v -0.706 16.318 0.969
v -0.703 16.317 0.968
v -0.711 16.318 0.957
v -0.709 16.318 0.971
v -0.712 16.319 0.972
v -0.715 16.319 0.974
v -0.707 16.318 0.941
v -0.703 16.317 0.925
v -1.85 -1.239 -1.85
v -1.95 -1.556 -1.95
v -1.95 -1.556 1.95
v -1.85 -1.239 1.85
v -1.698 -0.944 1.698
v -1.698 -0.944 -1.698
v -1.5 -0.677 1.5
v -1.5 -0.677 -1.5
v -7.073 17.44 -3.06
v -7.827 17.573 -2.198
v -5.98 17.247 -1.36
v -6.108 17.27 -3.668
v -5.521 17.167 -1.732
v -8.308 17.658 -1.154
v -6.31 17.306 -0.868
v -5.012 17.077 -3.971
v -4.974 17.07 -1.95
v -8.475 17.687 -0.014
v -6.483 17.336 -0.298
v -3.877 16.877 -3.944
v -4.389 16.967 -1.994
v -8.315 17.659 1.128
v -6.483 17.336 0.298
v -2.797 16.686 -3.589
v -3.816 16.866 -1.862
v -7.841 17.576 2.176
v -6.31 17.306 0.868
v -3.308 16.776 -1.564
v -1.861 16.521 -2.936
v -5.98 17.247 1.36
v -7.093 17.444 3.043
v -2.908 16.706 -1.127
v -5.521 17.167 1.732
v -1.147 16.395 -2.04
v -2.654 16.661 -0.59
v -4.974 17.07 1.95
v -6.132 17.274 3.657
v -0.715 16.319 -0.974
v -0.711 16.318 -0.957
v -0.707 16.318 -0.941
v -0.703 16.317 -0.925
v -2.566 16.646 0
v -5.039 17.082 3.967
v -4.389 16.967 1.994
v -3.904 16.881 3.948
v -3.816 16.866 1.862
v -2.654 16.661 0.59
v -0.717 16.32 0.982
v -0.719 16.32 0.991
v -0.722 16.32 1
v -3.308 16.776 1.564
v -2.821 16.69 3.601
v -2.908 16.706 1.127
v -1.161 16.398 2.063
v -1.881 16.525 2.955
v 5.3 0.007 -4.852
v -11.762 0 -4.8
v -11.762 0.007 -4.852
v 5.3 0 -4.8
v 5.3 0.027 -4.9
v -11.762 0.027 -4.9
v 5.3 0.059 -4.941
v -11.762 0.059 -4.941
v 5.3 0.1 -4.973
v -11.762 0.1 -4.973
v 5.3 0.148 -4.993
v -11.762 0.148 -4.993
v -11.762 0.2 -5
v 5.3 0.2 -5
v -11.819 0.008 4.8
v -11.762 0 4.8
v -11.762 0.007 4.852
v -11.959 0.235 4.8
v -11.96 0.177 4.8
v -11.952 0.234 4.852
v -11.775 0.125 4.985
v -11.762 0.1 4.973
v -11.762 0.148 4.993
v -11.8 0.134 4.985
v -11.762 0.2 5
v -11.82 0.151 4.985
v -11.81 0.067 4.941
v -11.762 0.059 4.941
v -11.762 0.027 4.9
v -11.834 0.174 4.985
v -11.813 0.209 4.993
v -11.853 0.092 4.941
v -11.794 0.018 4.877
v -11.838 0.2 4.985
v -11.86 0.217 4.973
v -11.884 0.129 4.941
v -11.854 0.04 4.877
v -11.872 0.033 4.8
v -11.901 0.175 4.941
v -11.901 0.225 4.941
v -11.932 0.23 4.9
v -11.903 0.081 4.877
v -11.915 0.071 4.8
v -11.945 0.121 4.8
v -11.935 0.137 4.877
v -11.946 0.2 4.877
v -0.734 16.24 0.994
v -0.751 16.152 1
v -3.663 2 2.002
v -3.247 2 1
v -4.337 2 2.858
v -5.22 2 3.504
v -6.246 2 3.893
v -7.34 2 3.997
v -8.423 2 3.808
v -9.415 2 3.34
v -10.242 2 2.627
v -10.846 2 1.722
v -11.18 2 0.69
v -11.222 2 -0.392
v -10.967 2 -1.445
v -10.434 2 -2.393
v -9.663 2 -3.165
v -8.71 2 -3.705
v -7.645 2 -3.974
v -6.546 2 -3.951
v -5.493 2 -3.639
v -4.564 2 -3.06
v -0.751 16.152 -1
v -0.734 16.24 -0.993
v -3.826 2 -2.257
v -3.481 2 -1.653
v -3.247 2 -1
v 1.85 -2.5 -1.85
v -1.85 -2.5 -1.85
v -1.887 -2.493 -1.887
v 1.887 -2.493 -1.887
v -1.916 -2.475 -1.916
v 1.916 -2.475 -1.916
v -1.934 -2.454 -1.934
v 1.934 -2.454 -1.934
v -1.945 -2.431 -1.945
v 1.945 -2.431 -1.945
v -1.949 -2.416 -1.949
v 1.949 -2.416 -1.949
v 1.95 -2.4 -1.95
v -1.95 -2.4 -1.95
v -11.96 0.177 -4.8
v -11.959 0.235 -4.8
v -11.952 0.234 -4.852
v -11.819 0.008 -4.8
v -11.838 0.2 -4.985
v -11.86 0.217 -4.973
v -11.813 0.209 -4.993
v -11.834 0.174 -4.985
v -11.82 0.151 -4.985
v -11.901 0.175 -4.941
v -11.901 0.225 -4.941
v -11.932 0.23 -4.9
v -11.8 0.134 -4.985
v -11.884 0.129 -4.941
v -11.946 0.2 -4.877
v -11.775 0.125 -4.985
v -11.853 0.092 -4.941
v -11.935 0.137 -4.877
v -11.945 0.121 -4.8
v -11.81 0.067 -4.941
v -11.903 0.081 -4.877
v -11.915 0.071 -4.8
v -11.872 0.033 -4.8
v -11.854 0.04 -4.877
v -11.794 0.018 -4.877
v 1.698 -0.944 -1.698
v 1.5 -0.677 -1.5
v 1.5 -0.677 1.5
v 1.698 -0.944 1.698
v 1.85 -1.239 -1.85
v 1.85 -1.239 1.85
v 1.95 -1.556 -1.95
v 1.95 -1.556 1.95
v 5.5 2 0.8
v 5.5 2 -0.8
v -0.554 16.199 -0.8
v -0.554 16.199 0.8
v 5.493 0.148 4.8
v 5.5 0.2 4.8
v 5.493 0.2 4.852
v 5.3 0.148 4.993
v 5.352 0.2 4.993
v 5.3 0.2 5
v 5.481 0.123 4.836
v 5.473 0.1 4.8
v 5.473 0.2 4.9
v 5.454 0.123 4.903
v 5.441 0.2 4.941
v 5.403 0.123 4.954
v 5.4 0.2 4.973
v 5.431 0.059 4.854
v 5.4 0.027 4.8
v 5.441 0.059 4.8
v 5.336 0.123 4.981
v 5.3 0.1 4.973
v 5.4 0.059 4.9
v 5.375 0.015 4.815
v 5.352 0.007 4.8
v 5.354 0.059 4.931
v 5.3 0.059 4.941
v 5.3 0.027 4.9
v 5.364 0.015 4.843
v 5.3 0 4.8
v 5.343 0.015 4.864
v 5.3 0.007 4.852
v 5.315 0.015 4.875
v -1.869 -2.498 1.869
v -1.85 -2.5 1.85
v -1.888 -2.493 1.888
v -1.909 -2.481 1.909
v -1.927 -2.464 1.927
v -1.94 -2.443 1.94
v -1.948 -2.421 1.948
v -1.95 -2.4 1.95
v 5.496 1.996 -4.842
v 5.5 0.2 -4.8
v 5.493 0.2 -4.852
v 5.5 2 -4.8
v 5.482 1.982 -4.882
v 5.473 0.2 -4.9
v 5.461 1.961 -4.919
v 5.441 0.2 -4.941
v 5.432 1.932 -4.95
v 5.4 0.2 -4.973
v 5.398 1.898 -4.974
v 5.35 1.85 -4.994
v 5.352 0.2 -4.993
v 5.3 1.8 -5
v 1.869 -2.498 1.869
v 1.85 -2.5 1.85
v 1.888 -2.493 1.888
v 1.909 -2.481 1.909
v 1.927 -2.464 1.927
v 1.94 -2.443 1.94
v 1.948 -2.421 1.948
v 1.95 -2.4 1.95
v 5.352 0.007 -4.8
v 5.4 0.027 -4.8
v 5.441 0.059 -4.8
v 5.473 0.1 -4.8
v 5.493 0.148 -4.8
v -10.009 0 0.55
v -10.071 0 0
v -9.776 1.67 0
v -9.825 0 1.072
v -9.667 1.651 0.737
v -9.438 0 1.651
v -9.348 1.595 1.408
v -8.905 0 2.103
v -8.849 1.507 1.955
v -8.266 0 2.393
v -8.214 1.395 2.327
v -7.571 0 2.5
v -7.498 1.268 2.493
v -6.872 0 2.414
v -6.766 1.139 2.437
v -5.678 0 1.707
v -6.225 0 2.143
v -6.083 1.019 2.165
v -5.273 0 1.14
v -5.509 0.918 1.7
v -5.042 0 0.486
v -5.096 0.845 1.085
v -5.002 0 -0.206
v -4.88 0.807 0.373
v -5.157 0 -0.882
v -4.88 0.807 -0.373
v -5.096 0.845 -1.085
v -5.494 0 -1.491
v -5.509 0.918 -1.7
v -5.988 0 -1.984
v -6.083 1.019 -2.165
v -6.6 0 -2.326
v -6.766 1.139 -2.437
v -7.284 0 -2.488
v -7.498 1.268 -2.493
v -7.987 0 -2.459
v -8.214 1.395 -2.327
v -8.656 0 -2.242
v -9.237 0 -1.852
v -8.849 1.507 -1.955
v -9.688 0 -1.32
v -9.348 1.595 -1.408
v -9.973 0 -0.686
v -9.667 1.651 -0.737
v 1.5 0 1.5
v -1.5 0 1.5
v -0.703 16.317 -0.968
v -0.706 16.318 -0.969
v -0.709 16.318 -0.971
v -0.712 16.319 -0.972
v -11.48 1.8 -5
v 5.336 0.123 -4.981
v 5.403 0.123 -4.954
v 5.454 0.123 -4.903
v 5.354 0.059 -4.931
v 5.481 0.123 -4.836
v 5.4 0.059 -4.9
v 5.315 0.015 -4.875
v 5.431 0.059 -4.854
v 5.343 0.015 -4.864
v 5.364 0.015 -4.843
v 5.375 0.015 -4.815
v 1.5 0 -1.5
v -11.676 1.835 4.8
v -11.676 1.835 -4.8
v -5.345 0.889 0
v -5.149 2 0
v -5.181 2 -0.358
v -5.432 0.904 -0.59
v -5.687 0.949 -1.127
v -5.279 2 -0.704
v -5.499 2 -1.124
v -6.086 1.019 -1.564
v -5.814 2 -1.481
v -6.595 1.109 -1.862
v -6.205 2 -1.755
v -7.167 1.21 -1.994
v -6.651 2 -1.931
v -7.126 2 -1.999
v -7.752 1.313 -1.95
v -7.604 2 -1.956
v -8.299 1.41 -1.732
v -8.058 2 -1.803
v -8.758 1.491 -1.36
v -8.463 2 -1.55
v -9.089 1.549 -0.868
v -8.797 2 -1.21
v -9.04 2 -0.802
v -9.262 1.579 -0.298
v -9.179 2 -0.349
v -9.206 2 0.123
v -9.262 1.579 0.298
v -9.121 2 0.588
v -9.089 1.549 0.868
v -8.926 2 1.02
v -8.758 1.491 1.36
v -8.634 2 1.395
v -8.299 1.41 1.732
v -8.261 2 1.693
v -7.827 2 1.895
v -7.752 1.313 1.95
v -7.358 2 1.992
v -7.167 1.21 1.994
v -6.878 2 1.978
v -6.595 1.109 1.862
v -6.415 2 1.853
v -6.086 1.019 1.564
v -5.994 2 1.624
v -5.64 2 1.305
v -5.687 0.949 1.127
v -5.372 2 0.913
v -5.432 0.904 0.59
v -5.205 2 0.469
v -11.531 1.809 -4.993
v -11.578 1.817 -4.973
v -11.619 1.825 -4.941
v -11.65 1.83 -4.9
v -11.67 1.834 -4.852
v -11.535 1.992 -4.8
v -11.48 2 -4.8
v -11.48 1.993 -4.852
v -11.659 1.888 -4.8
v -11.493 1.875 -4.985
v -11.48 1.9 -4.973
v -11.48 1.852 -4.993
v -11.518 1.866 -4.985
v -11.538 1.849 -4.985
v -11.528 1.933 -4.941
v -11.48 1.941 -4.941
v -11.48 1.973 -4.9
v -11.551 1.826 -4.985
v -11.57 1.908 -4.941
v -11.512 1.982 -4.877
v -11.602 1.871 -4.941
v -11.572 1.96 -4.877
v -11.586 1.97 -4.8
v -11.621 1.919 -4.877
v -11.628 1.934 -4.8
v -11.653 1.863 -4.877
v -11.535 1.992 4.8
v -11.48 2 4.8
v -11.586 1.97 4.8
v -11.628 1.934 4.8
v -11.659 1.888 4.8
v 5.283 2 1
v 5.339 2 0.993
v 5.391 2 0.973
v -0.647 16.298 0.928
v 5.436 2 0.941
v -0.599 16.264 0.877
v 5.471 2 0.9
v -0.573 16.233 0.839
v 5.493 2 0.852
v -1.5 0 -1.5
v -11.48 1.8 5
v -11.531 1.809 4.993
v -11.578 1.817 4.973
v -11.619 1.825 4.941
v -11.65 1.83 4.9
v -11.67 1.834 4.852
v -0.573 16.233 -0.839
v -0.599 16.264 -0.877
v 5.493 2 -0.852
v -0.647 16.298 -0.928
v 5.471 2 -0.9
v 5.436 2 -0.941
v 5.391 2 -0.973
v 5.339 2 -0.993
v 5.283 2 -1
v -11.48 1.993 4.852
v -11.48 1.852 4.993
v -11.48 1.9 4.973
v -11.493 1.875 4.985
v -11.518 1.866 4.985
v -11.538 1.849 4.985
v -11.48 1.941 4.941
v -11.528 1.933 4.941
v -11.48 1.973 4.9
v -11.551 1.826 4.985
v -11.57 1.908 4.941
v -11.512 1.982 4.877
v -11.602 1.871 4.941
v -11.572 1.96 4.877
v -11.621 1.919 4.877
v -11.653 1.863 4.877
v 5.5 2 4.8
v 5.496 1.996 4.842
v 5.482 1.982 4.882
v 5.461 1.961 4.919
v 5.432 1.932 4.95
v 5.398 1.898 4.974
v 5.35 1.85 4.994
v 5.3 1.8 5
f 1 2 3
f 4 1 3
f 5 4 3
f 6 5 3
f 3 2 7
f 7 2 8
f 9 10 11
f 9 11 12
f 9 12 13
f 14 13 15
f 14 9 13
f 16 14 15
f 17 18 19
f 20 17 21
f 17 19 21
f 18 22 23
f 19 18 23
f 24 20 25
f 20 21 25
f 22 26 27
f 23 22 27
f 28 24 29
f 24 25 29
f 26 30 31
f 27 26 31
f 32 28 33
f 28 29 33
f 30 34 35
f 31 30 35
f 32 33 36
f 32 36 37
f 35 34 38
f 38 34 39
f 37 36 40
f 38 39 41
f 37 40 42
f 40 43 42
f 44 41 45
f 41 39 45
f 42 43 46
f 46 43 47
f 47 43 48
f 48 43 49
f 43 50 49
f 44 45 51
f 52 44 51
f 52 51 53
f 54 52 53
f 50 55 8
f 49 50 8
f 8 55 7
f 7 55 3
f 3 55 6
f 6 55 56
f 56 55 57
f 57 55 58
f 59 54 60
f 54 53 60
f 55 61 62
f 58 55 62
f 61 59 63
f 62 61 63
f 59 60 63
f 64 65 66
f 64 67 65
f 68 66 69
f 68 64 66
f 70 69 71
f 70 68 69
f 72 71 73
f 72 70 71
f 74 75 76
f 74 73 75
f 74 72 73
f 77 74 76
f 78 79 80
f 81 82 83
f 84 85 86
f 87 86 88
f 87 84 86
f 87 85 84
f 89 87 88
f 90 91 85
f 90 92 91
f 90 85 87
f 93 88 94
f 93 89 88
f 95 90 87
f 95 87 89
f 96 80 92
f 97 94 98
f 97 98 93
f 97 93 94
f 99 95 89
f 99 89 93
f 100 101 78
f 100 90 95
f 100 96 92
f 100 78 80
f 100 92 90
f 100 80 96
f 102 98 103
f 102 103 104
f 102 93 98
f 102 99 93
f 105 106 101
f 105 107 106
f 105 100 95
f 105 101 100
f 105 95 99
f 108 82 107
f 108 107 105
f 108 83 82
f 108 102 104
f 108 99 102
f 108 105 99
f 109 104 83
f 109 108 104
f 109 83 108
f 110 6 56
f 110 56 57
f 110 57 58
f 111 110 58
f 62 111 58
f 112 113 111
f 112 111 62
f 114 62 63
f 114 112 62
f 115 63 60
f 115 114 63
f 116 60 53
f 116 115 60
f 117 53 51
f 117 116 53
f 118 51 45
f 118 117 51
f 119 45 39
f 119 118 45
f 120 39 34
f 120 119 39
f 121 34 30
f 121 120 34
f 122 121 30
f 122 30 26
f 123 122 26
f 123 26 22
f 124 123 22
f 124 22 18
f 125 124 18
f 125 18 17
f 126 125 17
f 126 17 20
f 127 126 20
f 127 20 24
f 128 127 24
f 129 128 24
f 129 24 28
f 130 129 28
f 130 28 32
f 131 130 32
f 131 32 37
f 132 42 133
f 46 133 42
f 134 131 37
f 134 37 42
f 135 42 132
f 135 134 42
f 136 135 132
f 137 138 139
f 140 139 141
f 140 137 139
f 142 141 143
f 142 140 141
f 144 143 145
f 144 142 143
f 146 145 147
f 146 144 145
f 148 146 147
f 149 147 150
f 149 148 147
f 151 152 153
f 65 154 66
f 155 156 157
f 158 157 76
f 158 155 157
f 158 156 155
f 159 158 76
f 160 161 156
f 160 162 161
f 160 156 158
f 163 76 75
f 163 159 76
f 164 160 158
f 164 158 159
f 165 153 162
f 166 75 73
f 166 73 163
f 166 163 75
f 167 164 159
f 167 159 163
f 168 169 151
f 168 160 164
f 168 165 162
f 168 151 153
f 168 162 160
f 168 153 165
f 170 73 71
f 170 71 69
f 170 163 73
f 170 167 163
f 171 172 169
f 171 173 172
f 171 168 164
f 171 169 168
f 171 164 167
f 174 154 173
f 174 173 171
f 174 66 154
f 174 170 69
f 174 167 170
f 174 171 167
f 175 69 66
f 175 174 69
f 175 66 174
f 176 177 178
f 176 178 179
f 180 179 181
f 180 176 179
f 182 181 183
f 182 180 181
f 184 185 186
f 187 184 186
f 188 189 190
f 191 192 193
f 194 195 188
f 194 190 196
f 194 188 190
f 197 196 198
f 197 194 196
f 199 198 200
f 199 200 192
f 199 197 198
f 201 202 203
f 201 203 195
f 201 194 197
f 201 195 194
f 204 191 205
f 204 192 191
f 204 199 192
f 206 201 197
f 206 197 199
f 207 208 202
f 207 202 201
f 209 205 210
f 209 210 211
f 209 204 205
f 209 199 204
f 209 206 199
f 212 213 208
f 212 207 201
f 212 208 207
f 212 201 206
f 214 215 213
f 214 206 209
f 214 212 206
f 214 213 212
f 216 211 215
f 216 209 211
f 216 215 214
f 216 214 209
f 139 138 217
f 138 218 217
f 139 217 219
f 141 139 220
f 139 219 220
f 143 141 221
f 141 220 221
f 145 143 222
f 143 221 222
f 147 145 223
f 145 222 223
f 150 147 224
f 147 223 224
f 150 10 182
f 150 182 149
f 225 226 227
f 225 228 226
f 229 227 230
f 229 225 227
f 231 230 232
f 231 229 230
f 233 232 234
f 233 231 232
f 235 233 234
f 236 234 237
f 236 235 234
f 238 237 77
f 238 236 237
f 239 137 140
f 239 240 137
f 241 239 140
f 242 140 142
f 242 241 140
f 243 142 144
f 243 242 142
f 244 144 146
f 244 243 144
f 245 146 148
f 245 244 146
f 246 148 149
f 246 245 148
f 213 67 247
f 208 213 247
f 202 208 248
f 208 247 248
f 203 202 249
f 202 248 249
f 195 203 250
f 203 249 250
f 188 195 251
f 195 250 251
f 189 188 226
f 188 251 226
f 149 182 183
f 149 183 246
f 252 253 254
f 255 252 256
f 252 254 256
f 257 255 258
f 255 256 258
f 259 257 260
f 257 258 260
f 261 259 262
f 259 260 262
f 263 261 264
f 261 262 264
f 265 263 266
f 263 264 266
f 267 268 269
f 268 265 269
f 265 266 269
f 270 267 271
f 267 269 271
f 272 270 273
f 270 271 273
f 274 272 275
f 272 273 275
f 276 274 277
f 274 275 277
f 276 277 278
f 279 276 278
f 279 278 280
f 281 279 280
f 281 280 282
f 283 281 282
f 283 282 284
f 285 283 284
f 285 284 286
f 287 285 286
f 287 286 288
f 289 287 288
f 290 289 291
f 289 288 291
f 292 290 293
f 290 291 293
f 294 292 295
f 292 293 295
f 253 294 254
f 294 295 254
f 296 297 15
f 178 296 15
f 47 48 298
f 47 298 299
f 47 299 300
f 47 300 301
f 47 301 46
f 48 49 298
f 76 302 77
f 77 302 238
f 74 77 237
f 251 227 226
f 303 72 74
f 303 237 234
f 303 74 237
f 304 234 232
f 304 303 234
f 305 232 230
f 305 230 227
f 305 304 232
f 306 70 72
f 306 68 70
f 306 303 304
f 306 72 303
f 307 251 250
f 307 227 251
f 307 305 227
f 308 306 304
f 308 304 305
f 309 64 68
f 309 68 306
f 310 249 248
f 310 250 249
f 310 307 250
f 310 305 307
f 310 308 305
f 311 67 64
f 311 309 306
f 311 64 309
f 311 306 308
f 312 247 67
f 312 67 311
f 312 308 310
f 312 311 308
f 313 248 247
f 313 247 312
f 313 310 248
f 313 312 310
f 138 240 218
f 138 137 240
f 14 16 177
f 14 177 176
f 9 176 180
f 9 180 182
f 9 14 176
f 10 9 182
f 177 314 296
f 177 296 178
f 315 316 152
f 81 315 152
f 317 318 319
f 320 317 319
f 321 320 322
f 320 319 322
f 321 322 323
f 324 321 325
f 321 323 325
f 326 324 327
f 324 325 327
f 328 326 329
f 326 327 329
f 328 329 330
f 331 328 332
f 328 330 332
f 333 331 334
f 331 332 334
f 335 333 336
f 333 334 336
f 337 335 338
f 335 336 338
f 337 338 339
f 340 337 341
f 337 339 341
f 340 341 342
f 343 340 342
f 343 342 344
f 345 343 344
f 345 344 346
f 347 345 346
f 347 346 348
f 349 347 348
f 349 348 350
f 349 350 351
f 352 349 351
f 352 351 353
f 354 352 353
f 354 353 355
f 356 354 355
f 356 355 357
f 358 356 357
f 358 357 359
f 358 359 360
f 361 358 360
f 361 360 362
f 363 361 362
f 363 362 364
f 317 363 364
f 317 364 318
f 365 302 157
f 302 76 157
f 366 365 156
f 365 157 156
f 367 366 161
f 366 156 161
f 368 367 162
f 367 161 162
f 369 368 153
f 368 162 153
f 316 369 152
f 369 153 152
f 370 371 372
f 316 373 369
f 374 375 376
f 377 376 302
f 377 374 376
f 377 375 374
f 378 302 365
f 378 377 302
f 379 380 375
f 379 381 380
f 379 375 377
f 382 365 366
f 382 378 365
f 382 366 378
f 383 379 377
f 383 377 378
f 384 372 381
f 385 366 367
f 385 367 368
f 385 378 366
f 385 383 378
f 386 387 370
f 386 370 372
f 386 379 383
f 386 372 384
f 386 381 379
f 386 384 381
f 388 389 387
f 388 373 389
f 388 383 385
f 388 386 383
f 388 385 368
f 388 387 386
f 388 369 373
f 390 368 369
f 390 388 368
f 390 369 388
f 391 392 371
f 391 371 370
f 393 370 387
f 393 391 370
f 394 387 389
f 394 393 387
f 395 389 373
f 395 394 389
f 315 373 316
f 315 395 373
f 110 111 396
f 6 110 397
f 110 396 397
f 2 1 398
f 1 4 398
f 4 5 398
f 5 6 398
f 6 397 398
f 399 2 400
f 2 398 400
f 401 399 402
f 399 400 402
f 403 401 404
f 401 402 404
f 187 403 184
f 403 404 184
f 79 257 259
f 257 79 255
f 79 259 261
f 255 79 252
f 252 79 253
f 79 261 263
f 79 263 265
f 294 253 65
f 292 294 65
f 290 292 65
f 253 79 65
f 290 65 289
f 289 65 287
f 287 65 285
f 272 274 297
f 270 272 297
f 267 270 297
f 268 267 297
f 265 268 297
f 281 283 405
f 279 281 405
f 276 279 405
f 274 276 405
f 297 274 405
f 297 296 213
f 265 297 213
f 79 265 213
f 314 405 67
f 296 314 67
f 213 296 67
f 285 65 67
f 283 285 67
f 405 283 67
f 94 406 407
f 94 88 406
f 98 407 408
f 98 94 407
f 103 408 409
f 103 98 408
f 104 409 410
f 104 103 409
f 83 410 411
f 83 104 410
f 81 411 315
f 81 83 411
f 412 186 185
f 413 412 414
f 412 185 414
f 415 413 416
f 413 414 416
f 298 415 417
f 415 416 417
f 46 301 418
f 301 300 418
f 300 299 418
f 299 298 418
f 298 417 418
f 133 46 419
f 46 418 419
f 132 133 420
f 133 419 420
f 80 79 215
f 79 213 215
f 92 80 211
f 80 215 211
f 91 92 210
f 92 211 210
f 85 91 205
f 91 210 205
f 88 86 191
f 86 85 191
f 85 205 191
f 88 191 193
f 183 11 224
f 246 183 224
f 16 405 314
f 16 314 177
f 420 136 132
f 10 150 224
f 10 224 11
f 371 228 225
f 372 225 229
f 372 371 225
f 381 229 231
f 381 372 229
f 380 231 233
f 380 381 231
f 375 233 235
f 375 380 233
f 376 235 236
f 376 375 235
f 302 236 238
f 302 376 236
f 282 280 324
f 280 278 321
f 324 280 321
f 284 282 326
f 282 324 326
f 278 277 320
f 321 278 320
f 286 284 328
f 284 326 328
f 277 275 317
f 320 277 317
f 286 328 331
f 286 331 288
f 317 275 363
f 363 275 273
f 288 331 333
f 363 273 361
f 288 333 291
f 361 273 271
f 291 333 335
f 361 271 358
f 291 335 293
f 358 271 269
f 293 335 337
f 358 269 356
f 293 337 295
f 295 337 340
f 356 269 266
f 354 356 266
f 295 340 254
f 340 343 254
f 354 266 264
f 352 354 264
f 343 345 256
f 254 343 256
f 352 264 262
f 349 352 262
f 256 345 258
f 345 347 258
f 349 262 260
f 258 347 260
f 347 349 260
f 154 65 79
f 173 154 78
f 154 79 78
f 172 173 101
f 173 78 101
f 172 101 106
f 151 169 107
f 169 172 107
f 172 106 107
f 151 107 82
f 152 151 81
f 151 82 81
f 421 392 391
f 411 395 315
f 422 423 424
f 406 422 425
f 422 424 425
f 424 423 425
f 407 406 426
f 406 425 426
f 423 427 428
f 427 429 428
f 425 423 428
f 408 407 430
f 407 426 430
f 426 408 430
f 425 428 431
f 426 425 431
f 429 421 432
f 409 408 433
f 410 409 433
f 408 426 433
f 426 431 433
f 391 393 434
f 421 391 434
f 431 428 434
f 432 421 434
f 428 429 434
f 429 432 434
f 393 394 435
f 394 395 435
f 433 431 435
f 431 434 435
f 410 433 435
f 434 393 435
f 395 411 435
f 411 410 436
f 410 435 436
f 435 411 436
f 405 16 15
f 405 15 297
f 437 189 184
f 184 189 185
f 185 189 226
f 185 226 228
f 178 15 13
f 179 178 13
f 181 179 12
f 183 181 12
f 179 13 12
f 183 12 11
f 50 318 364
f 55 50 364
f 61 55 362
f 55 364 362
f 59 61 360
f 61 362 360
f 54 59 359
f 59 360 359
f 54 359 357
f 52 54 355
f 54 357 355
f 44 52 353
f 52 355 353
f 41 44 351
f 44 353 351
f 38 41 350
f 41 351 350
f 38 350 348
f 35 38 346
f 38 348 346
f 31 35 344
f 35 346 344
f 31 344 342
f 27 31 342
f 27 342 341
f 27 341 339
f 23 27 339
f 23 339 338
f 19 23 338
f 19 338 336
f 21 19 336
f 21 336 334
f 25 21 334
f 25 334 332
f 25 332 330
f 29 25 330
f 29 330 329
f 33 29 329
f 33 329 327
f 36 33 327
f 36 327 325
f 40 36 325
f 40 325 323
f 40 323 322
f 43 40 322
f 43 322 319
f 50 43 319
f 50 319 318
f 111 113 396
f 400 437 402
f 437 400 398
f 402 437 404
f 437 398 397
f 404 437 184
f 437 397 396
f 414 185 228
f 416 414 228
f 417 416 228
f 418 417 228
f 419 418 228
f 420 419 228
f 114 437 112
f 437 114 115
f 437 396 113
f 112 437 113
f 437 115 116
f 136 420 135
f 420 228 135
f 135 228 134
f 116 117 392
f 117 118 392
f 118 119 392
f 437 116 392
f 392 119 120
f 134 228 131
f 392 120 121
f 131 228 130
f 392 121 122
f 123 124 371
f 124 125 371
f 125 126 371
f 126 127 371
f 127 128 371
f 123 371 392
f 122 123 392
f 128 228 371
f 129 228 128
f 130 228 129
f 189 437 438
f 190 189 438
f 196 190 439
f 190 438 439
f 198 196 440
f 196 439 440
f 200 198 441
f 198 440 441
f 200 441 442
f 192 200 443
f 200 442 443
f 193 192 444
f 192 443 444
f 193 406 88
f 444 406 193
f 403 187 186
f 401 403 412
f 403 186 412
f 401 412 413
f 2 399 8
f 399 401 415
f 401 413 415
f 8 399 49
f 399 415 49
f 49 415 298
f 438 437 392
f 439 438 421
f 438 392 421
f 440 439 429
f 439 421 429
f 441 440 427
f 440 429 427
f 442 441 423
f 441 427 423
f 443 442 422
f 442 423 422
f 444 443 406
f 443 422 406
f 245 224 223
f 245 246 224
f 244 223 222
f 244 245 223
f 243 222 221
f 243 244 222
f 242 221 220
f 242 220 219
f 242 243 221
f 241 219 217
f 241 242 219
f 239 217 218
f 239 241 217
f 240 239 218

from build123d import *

# Parameters (mm, degrees)
EXTRUDE_1_DEPTH          = 5
EXTRUDE_1_DEPTH_BACK     = 5
EXTRUDE_2_DEPTH          = 2
EXTRUDE_2_DEPTH_BACK     = 2
CUT_EXTRUDE_1_DEPTH      = 2
CUT_EXTRUDE_1_DEPTH_BACK = 2
SKETCH_5_R               = 4
SKETCH_5_R_2             = 2
EXTRUDE_3_DEPTH          = 16
EXTRUDE_4_DEPTH          = 1
EXTRUDE_4_DEPTH_BACK     = 1
CUT_EXTRUDE_2_REACH      = 41.97
CUT_EXTRUDE_START        = -16
SKETCH_7_R               = 2.5
CUT_EXTRUDE_3_REACH      = 25.97
SKETCH_8_R               = 2
FILLET_3_R               = 0.2
FILLET_5_R               = 0.2
FILLET_7_R               = 0.2
FILLET_8_R               = 0.1


with BuildPart() as part:
    # 草图1 → 凸台-拉伸1 (new, two sides: drawn at the far end of the back side and taken through both)
    with BuildSketch(Plane.XY.offset(-EXTRUDE_1_DEPTH_BACK)):
        Polygon((0, 0), (5.5, 0), (5.5, 2), (-11.647346039, 2), (-12, 0), align=None)
    extrude(amount=EXTRUDE_1_DEPTH + EXTRUDE_1_DEPTH_BACK)

    # 草图2 → 凸台-拉伸2 (add, two sides: drawn at the far end of the back side and taken through both)
    with BuildSketch(Plane.XY.offset(-EXTRUDE_2_DEPTH_BACK)):
        with BuildLine():
            Line((-1.5, 0), (1.5, 0))
            Line((1.5, 0), (1.5, -0.677124344))
            ThreePointArc((1.5, -0.677124344), (1.780042303, -1.088161527), (1.95, -1.555590279))
            Line((1.95, -1.555590279), (1.95, -2.5))
            Line((1.95, -2.5), (-1.95, -2.5))
            Line((-1.95, -2.5), (-1.95, -1.555590279))
            ThreePointArc((-1.95, -1.555590279), (-1.780042303, -1.088161527), (-1.5, -0.677124344))
            Line((-1.5, -0.677124344), (-1.5, 0))
        make_face()
    extrude(amount=EXTRUDE_2_DEPTH + EXTRUDE_2_DEPTH_BACK)

    # 草图3 → 切除-拉伸1 (cut, two sides: drawn at the far end of the back side and taken through both)
    with BuildSketch(Plane(origin=(0, 0, 0), x_dir=(0, 0, -1), z_dir=(1, 0, 0)).offset(-CUT_EXTRUDE_1_DEPTH_BACK)):
        with BuildLine():
            Line((1.5, 0), (1.5, -0.677124344))
            ThreePointArc((1.5, -0.677124344), (1.780042303, -1.088161527), (1.95, -1.555590279))
            Line((1.95, -1.555590279), (1.95, -2.5))
            Line((1.95, -2.5), (2, -2.5))
            Line((2, -2.5), (2, 0))
            Line((2, 0), (1.5, 0))
        make_face()
        with BuildLine():
            Line((-2, 0), (-1.5, 0))
            Line((-1.5, 0), (-1.5, -0.677124344))
            ThreePointArc((-1.5, -0.677124344), (-1.780042303, -1.088161527), (-1.95, -1.555590279))
            Line((-1.95, -1.555590279), (-1.95, -2.5))
            Line((-1.95, -2.5), (-2, -2.5))
            Line((-2, -2.5), (-2, 0))
        make_face()
    extrude(amount=CUT_EXTRUDE_1_DEPTH + CUT_EXTRUDE_1_DEPTH_BACK, mode=Mode.SUBTRACT)

    # 草图5 → 凸台-拉伸3 (add)
    with BuildSketch(Plane(origin=(-11.647346039, 2, 5), x_dir=(-0.9848077530122089, 0.17364817766692556, 0), z_dir=(-0.17364817766692556, -0.984807753012209, 0))):
        with Locations(Location((-4.4, 5, 0), (0, 0, 180))):
            Circle(SKETCH_5_R)
        with Locations(Location((-4.4, 5, 0), (0, 0, 180))):
            Circle(SKETCH_5_R_2, mode=Mode.SUBTRACT)
    extrude(amount=-EXTRUDE_3_DEPTH)

    # 草图6 → 凸台-拉伸4 (add, two sides: drawn at the far end of the back side and taken through both)
    with BuildSketch(Plane.XY.offset(-EXTRUDE_4_DEPTH_BACK)):
        Polygon((5.5, 2), (-0.596590071, 16.298279356), (-2.0738017, 16.558751622), (-4.640902417, 2), align=None)
    extrude(amount=EXTRUDE_4_DEPTH + EXTRUDE_4_DEPTH_BACK)

    # 切除-拉伸2: up to this plane
    cut_extrude_2_end = Plane(origin=(0, 0, -5), z_dir=(0, -1, 0))
    # 草图7 → 切除-拉伸2 (cut, up to the surface)
    with BuildSketch(Plane(origin=(2.769180529, 15.704803188, 0), x_dir=(0.9848077530122089, -0.17364817766692558, 0), z_dir=(0.17364817766692558, 0.984807753012209, 0)).offset(CUT_EXTRUDE_START), mode=Mode.PRIVATE) as cut_extrude_2_sk1:
        with Locations(Location((-7.417693036, 0, 0), (0, 0, 180))):
            Circle(SKETCH_7_R)
    cut_extrude_2_tool1 = split(extrude(cut_extrude_2_sk1.sketch, amount=-CUT_EXTRUDE_2_REACH, mode=Mode.PRIVATE), bisect_by=cut_extrude_2_end, keep=Keep.BOTH, mode=Mode.PRIVATE)
    add(cut_extrude_2_tool1.solids().sort_by_distance((-7.314192, 1.235948, 0))[0], mode=Mode.SUBTRACT)

    # 草图8 → 切除-拉伸3 (cut, up to next)
    with BuildSketch(Plane(origin=(2.769180529, 15.704803188, 0), x_dir=(0.9848077530122089, -0.17364817766692558, 0), z_dir=(0.17364817766692558, 0.984807753012209, 0)), mode=Mode.PRIVATE) as cut_extrude_3_sk1:
        with Locations((-7.417693036, 0)):
            Circle(SKETCH_8_R)
    cut_extrude_3_tool1 = extrude(cut_extrude_3_sk1.sketch, amount=-CUT_EXTRUDE_3_REACH, mode=Mode.PRIVATE) & part.part
    add(cut_extrude_3_tool1.solids().sort_by_distance((-4.535821, 16.992872, 0))[0], mode=Mode.SUBTRACT)

    # 圆角3
    fillet_3_edges = [part.edges().sort_by_distance(p)[0] for p in [
        (5.5, 1, -5),
        (-3.073673019, 2, -5),
        (-3.25, 0, 5),
        (5.5, 1, 5),
        (-11.823673019, 1, -5),
        (-3.073673019, 2, 5),
        (-11.823673019, 1, 5),
        (-3.25, 0, -5),
        (-12, 0, 0),
        (-11.647346039, 2, 0),
    ]]
    fillet(fillet_3_edges, radius=FILLET_3_R)

    # 圆角5
    # the kernel refuses this fillet: 0.2 mm, written as the material it takes off along each edge
    with BuildSketch(Plane(origin=(5.3, 0.2, 4.8), x_dir=(1, 0, 0), z_dir=(0, -1, 0))) as fillet_5_piece_1_section:
        Polygon((0, 0), (FILLET_5_R, 0), (FILLET_5_R, FILLET_5_R), (0, FILLET_5_R), align=None)
    fillet_5_piece_1 = extrude(amount=FILLET_5_R, mode=Mode.PRIVATE)
    fillet_5_piece_1 = fillet_5_piece_1 - Plane(origin=(5.3, 0.2, 4.8), x_dir=(-0.7071067811865475, 0, -0.7071067811865475), z_dir=(0, -1, 0)) * Sphere(FILLET_5_R, mode=Mode.PRIVATE)
    add(fillet_5_piece_1, mode=Mode.SUBTRACT)
    with BuildSketch(Plane(origin=(5.3, 0.2, -4.8), x_dir=(1, 0, 0), z_dir=(0, -1, 0))) as fillet_5_piece_2_section:
        Polygon((0, 0), (FILLET_5_R, 0), (FILLET_5_R, -FILLET_5_R), (0, -FILLET_5_R), align=None)
    fillet_5_piece_2 = extrude(amount=FILLET_5_R, mode=Mode.PRIVATE)
    fillet_5_piece_2 = fillet_5_piece_2 - Plane(origin=(5.3, 0.2, -4.8), x_dir=(-0.7071067811865475, 0, 0.7071067811865475), z_dir=(0, -1, 0)) * Sphere(FILLET_5_R, mode=Mode.PRIVATE)
    add(fillet_5_piece_2, mode=Mode.SUBTRACT)
    with BuildSketch(Plane(origin=(5.5, 0, -4.8), x_dir=(-1, 0, 0), z_dir=(0, 0, 1))) as fillet_5_piece_3:
        with BuildLine():
            CenterArc((FILLET_5_R, -FILLET_5_R), FILLET_5_R, 90, 90)
            Line((0, -FILLET_5_R), (0, 0))
            Line((0, 0), (FILLET_5_R, 0))
        make_face()
    extrude(amount=9.6, mode=Mode.SUBTRACT)

    # 圆角7
    # the kernel refuses this fillet: 0.2 mm, written as the material it takes off along each edge
    with BuildSketch(Plane(origin=(-0.596590071, 16.298279356, -1.270954164), x_dir=(0.39222047204702226, -0.9198712417002779, 0), z_dir=(0, 0, 1))) as fillet_7_piece_1:
        with BuildLine():
            CenterArc((FILLET_7_R * 0.541908328714, -FILLET_7_R), FILLET_7_R, 90, 56.907265605)
            Line((-FILLET_7_R * 0.295879631671, -FILLET_7_R * 0.454004273429), (0, 0))
            Line((0, 0), (FILLET_7_R * 0.541908328714, 0))
        make_face()
    extrude(amount=2.541908329, mode=Mode.SUBTRACT)
    with BuildSketch(Plane(origin=(5.696110236, 1.540064379, -1), x_dir=(0, 0, 1), z_dir=(-0.39222047204701954, 0.9198712417002791, 0))) as fillet_7_piece_2_section:
        with BuildLine():
            CenterArc((FILLET_7_R, -FILLET_7_R), FILLET_7_R, 90, 90)
            Line((0, -FILLET_7_R), (0, 0))
            Line((0, 0), (FILLET_7_R, 0))
        make_face()
    fillet_7_piece_2 = extrude(amount=16.543783421, mode=Mode.PRIVATE)
    fillet_7_piece_2 = split(fillet_7_piece_2, bisect_by=Plane(origin=(2.402045939, 2, -0.955327029), z_dir=(0, 1, 0)), keep=Keep.TOP, mode=Mode.PRIVATE)
    fillet_7_piece_2 = fillet_7_piece_2 - Plane(origin=(-5.66753398, 10.574609288, 0), x_dir=(0.984807753012209, -0.17364817766692556, 0), z_dir=(-0.17364817766692556, -0.984807753012209, 0)) * Cylinder(4, 34, mode=Mode.PRIVATE)
    add(fillet_7_piece_2, mode=Mode.SUBTRACT)
    with BuildSketch(Plane(origin=(5.696110236, 1.540064379, 1), x_dir=(0, 0, -1), z_dir=(-0.39222047204701954, 0.9198712417002791, 0))) as fillet_7_piece_3_section:
        with BuildLine():
            CenterArc((FILLET_7_R, FILLET_7_R), FILLET_7_R, 180, 90)
            Line((0, FILLET_7_R), (0, 0))
            Line((0, 0), (FILLET_7_R, 0))
        make_face()
    fillet_7_piece_3 = extrude(amount=16.543783421, mode=Mode.PRIVATE)
    fillet_7_piece_3 = split(fillet_7_piece_3, bisect_by=Plane(origin=(2.402045936, 2, 0.955327029), z_dir=(0, 1, 0)), keep=Keep.TOP, mode=Mode.PRIVATE)
    fillet_7_piece_3 = fillet_7_piece_3 - Plane(origin=(-5.667533979, 10.574609294, 0), x_dir=(0.984807753012209, -0.17364817766692556, 0), z_dir=(-0.17364817766692556, -0.984807753012209, 0)) * Cylinder(4, 34, mode=Mode.PRIVATE)
    add(fillet_7_piece_3, mode=Mode.SUBTRACT)

    # 圆角8
    fillet_8_edges = [part.edges().sort_by_distance(p)[0] for p in [
        (0, -2.5, 1.95),
        (1.95, -2.5, 0),
        (-1.95, -2.5, 0),
        (0, -2.5, -1.95),
    ]]
    fillet(fillet_8_edges, radius=FILLET_8_R)


solid = part.part
